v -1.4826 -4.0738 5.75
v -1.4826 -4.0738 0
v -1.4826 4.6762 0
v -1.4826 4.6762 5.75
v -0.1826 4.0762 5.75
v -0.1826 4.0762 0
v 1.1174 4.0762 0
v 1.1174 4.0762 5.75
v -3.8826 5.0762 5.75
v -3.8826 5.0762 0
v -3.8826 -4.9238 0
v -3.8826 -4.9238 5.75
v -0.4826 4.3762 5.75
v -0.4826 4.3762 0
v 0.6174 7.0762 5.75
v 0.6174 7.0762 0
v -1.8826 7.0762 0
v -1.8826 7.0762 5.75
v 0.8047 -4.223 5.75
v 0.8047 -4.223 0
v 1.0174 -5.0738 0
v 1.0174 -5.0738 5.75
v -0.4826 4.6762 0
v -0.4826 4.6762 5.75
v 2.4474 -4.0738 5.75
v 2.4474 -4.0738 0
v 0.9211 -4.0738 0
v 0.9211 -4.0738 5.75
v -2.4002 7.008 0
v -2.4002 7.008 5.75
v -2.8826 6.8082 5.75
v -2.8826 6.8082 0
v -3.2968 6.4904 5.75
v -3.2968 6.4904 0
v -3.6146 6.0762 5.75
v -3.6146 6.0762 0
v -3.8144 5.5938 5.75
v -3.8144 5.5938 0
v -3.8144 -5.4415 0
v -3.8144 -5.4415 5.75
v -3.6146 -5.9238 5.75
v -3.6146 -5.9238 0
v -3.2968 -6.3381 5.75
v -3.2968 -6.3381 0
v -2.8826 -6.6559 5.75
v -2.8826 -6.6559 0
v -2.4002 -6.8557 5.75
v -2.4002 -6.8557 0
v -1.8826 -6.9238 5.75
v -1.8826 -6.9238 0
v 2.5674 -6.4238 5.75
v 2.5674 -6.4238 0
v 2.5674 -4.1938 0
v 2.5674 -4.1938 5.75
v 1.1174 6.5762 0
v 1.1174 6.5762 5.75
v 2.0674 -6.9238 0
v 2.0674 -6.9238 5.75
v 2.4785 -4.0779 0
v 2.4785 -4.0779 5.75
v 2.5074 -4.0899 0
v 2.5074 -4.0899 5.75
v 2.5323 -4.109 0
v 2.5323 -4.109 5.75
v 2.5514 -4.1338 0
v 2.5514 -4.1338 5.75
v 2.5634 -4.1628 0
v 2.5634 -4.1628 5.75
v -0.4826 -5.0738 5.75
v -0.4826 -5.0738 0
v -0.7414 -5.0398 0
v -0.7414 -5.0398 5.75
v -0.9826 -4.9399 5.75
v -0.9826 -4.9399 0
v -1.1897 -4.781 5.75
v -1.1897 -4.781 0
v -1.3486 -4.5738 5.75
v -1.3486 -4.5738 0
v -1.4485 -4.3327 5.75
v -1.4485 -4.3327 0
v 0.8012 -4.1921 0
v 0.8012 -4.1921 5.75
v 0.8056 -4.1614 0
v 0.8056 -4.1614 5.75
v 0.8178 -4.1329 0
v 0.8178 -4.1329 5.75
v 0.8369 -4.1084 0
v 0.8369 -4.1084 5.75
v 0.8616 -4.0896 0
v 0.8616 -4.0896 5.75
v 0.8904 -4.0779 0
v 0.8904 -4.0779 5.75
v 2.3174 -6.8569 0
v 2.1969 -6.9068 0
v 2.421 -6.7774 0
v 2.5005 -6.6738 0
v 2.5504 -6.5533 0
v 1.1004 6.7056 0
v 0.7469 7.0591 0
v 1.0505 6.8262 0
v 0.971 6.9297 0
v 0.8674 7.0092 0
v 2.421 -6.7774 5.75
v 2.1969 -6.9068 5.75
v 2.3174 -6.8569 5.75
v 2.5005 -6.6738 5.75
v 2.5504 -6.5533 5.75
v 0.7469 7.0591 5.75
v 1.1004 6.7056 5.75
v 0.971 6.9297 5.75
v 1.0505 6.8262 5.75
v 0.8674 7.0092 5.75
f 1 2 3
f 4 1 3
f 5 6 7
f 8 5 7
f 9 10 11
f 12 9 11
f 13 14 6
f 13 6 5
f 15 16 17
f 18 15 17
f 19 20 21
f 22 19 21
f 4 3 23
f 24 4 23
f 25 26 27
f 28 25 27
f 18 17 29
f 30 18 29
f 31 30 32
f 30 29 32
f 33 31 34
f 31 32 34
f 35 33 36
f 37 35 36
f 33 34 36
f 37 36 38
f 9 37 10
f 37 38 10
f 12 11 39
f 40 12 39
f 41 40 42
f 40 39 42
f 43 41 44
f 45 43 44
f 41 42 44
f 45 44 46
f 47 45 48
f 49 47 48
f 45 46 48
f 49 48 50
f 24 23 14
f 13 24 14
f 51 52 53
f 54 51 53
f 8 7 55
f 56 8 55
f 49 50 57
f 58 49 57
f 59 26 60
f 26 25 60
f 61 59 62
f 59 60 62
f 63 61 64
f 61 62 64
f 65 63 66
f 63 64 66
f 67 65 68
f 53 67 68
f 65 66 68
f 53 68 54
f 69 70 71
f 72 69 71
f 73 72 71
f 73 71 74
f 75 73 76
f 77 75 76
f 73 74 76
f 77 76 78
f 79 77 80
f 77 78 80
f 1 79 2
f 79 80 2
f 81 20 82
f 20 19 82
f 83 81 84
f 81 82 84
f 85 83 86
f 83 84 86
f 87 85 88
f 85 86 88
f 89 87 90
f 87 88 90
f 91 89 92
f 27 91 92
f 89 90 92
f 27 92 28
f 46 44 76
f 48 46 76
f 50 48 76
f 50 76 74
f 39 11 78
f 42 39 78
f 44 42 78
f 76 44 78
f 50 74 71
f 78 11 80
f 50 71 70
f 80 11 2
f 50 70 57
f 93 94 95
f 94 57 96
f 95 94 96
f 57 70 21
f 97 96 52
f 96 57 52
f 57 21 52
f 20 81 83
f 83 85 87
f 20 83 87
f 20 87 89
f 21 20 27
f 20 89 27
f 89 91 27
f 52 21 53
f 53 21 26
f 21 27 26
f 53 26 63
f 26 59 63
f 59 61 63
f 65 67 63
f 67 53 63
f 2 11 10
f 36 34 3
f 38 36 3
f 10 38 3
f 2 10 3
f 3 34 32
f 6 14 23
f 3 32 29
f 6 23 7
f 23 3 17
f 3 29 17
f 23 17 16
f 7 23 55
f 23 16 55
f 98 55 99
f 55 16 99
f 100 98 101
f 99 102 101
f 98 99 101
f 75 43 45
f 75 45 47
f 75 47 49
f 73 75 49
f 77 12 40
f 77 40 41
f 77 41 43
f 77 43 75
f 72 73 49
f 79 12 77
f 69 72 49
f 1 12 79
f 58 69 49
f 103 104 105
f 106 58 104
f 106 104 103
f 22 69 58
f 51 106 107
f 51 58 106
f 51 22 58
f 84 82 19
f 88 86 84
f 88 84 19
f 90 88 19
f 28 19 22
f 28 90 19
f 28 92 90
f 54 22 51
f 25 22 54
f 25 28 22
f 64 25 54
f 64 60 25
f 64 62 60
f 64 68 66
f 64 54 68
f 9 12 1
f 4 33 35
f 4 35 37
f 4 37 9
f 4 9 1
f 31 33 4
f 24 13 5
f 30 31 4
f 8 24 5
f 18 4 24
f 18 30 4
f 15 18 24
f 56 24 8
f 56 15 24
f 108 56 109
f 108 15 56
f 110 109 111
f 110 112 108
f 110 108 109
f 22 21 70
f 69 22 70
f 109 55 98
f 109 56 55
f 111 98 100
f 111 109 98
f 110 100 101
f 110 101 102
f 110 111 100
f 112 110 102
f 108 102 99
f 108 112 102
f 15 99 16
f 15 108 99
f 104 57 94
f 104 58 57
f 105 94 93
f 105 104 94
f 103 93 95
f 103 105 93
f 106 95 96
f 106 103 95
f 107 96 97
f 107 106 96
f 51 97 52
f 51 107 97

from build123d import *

# Parameters (mm, degrees)
F1_DEPTH = 5.75
F2_R     = 0.5
F3_SIZE  = 0.3
F4_R     = 0.12


with BuildPart() as f1:
    # F0 (on Top) → F1 (new body)
    with BuildSketch(Plane.XY):
        with BuildLine():
            Line((-0.482554, 4.676151), (-0.482554, 4.076151))
            Line((-0.482554, 4.076151), (1.117446, 4.076151))
            Line((1.117446, 4.076151), (1.117446, 7.076151))
            Line((1.117446, 7.076151), (-1.882554, 7.076151))
            ThreePointArc((-1.882554, 7.076151), (-3.296768, 6.490364), (-3.882554, 5.076151))
            Line((-3.882554, 5.076151), (-3.882554, -4.923849))
            ThreePointArc((-3.882554, -4.923849), (-3.296768, -6.338063), (-1.882554, -6.923849))
            Line((-1.882554, -6.923849), (2.567446, -6.923849))
            Line((2.567446, -6.923849), (2.567446, -4.073849))
            Line((2.567446, -4.073849), (0.767446, -4.073849))
            Line((0.767446, -4.073849), (1.017446, -5.073849))
            Line((1.017446, -5.073849), (-0.482554, -5.073849))
            ThreePointArc((-0.482554, -5.073849), (-1.189661, -4.780956), (-1.482554, -4.073849))
            Line((-1.482554, -4.073849), (-1.482554, 4.676151))
            Line((-1.482554, 4.676151), (-0.482554, 4.676151))
        make_face()
    extrude(amount=F1_DEPTH)

    # F2
    f2_edges = [f1.edges().sort_by_distance(p)[0] for p in [
        (2.567446, -6.923849, 2.875),
        (1.117446, 7.076151, 2.875),
    ]]
    fillet(f2_edges, radius=F2_R)

    # F3
    f3_edges = [f1.edges().sort_by_distance(p)[0] for p in [
        (-0.482554, 4.076151, 2.875),
    ]]
    chamfer(f3_edges, length=F3_SIZE)

    # F4
    f4_edges = [f1.edges().sort_by_distance(p)[0] for p in [
        (0.767446, -4.073849, 2.875),
        (2.567446, -4.073849, 2.875),
    ]]
    fillet(f4_edges, radius=F4_R)


solid = f1.part
